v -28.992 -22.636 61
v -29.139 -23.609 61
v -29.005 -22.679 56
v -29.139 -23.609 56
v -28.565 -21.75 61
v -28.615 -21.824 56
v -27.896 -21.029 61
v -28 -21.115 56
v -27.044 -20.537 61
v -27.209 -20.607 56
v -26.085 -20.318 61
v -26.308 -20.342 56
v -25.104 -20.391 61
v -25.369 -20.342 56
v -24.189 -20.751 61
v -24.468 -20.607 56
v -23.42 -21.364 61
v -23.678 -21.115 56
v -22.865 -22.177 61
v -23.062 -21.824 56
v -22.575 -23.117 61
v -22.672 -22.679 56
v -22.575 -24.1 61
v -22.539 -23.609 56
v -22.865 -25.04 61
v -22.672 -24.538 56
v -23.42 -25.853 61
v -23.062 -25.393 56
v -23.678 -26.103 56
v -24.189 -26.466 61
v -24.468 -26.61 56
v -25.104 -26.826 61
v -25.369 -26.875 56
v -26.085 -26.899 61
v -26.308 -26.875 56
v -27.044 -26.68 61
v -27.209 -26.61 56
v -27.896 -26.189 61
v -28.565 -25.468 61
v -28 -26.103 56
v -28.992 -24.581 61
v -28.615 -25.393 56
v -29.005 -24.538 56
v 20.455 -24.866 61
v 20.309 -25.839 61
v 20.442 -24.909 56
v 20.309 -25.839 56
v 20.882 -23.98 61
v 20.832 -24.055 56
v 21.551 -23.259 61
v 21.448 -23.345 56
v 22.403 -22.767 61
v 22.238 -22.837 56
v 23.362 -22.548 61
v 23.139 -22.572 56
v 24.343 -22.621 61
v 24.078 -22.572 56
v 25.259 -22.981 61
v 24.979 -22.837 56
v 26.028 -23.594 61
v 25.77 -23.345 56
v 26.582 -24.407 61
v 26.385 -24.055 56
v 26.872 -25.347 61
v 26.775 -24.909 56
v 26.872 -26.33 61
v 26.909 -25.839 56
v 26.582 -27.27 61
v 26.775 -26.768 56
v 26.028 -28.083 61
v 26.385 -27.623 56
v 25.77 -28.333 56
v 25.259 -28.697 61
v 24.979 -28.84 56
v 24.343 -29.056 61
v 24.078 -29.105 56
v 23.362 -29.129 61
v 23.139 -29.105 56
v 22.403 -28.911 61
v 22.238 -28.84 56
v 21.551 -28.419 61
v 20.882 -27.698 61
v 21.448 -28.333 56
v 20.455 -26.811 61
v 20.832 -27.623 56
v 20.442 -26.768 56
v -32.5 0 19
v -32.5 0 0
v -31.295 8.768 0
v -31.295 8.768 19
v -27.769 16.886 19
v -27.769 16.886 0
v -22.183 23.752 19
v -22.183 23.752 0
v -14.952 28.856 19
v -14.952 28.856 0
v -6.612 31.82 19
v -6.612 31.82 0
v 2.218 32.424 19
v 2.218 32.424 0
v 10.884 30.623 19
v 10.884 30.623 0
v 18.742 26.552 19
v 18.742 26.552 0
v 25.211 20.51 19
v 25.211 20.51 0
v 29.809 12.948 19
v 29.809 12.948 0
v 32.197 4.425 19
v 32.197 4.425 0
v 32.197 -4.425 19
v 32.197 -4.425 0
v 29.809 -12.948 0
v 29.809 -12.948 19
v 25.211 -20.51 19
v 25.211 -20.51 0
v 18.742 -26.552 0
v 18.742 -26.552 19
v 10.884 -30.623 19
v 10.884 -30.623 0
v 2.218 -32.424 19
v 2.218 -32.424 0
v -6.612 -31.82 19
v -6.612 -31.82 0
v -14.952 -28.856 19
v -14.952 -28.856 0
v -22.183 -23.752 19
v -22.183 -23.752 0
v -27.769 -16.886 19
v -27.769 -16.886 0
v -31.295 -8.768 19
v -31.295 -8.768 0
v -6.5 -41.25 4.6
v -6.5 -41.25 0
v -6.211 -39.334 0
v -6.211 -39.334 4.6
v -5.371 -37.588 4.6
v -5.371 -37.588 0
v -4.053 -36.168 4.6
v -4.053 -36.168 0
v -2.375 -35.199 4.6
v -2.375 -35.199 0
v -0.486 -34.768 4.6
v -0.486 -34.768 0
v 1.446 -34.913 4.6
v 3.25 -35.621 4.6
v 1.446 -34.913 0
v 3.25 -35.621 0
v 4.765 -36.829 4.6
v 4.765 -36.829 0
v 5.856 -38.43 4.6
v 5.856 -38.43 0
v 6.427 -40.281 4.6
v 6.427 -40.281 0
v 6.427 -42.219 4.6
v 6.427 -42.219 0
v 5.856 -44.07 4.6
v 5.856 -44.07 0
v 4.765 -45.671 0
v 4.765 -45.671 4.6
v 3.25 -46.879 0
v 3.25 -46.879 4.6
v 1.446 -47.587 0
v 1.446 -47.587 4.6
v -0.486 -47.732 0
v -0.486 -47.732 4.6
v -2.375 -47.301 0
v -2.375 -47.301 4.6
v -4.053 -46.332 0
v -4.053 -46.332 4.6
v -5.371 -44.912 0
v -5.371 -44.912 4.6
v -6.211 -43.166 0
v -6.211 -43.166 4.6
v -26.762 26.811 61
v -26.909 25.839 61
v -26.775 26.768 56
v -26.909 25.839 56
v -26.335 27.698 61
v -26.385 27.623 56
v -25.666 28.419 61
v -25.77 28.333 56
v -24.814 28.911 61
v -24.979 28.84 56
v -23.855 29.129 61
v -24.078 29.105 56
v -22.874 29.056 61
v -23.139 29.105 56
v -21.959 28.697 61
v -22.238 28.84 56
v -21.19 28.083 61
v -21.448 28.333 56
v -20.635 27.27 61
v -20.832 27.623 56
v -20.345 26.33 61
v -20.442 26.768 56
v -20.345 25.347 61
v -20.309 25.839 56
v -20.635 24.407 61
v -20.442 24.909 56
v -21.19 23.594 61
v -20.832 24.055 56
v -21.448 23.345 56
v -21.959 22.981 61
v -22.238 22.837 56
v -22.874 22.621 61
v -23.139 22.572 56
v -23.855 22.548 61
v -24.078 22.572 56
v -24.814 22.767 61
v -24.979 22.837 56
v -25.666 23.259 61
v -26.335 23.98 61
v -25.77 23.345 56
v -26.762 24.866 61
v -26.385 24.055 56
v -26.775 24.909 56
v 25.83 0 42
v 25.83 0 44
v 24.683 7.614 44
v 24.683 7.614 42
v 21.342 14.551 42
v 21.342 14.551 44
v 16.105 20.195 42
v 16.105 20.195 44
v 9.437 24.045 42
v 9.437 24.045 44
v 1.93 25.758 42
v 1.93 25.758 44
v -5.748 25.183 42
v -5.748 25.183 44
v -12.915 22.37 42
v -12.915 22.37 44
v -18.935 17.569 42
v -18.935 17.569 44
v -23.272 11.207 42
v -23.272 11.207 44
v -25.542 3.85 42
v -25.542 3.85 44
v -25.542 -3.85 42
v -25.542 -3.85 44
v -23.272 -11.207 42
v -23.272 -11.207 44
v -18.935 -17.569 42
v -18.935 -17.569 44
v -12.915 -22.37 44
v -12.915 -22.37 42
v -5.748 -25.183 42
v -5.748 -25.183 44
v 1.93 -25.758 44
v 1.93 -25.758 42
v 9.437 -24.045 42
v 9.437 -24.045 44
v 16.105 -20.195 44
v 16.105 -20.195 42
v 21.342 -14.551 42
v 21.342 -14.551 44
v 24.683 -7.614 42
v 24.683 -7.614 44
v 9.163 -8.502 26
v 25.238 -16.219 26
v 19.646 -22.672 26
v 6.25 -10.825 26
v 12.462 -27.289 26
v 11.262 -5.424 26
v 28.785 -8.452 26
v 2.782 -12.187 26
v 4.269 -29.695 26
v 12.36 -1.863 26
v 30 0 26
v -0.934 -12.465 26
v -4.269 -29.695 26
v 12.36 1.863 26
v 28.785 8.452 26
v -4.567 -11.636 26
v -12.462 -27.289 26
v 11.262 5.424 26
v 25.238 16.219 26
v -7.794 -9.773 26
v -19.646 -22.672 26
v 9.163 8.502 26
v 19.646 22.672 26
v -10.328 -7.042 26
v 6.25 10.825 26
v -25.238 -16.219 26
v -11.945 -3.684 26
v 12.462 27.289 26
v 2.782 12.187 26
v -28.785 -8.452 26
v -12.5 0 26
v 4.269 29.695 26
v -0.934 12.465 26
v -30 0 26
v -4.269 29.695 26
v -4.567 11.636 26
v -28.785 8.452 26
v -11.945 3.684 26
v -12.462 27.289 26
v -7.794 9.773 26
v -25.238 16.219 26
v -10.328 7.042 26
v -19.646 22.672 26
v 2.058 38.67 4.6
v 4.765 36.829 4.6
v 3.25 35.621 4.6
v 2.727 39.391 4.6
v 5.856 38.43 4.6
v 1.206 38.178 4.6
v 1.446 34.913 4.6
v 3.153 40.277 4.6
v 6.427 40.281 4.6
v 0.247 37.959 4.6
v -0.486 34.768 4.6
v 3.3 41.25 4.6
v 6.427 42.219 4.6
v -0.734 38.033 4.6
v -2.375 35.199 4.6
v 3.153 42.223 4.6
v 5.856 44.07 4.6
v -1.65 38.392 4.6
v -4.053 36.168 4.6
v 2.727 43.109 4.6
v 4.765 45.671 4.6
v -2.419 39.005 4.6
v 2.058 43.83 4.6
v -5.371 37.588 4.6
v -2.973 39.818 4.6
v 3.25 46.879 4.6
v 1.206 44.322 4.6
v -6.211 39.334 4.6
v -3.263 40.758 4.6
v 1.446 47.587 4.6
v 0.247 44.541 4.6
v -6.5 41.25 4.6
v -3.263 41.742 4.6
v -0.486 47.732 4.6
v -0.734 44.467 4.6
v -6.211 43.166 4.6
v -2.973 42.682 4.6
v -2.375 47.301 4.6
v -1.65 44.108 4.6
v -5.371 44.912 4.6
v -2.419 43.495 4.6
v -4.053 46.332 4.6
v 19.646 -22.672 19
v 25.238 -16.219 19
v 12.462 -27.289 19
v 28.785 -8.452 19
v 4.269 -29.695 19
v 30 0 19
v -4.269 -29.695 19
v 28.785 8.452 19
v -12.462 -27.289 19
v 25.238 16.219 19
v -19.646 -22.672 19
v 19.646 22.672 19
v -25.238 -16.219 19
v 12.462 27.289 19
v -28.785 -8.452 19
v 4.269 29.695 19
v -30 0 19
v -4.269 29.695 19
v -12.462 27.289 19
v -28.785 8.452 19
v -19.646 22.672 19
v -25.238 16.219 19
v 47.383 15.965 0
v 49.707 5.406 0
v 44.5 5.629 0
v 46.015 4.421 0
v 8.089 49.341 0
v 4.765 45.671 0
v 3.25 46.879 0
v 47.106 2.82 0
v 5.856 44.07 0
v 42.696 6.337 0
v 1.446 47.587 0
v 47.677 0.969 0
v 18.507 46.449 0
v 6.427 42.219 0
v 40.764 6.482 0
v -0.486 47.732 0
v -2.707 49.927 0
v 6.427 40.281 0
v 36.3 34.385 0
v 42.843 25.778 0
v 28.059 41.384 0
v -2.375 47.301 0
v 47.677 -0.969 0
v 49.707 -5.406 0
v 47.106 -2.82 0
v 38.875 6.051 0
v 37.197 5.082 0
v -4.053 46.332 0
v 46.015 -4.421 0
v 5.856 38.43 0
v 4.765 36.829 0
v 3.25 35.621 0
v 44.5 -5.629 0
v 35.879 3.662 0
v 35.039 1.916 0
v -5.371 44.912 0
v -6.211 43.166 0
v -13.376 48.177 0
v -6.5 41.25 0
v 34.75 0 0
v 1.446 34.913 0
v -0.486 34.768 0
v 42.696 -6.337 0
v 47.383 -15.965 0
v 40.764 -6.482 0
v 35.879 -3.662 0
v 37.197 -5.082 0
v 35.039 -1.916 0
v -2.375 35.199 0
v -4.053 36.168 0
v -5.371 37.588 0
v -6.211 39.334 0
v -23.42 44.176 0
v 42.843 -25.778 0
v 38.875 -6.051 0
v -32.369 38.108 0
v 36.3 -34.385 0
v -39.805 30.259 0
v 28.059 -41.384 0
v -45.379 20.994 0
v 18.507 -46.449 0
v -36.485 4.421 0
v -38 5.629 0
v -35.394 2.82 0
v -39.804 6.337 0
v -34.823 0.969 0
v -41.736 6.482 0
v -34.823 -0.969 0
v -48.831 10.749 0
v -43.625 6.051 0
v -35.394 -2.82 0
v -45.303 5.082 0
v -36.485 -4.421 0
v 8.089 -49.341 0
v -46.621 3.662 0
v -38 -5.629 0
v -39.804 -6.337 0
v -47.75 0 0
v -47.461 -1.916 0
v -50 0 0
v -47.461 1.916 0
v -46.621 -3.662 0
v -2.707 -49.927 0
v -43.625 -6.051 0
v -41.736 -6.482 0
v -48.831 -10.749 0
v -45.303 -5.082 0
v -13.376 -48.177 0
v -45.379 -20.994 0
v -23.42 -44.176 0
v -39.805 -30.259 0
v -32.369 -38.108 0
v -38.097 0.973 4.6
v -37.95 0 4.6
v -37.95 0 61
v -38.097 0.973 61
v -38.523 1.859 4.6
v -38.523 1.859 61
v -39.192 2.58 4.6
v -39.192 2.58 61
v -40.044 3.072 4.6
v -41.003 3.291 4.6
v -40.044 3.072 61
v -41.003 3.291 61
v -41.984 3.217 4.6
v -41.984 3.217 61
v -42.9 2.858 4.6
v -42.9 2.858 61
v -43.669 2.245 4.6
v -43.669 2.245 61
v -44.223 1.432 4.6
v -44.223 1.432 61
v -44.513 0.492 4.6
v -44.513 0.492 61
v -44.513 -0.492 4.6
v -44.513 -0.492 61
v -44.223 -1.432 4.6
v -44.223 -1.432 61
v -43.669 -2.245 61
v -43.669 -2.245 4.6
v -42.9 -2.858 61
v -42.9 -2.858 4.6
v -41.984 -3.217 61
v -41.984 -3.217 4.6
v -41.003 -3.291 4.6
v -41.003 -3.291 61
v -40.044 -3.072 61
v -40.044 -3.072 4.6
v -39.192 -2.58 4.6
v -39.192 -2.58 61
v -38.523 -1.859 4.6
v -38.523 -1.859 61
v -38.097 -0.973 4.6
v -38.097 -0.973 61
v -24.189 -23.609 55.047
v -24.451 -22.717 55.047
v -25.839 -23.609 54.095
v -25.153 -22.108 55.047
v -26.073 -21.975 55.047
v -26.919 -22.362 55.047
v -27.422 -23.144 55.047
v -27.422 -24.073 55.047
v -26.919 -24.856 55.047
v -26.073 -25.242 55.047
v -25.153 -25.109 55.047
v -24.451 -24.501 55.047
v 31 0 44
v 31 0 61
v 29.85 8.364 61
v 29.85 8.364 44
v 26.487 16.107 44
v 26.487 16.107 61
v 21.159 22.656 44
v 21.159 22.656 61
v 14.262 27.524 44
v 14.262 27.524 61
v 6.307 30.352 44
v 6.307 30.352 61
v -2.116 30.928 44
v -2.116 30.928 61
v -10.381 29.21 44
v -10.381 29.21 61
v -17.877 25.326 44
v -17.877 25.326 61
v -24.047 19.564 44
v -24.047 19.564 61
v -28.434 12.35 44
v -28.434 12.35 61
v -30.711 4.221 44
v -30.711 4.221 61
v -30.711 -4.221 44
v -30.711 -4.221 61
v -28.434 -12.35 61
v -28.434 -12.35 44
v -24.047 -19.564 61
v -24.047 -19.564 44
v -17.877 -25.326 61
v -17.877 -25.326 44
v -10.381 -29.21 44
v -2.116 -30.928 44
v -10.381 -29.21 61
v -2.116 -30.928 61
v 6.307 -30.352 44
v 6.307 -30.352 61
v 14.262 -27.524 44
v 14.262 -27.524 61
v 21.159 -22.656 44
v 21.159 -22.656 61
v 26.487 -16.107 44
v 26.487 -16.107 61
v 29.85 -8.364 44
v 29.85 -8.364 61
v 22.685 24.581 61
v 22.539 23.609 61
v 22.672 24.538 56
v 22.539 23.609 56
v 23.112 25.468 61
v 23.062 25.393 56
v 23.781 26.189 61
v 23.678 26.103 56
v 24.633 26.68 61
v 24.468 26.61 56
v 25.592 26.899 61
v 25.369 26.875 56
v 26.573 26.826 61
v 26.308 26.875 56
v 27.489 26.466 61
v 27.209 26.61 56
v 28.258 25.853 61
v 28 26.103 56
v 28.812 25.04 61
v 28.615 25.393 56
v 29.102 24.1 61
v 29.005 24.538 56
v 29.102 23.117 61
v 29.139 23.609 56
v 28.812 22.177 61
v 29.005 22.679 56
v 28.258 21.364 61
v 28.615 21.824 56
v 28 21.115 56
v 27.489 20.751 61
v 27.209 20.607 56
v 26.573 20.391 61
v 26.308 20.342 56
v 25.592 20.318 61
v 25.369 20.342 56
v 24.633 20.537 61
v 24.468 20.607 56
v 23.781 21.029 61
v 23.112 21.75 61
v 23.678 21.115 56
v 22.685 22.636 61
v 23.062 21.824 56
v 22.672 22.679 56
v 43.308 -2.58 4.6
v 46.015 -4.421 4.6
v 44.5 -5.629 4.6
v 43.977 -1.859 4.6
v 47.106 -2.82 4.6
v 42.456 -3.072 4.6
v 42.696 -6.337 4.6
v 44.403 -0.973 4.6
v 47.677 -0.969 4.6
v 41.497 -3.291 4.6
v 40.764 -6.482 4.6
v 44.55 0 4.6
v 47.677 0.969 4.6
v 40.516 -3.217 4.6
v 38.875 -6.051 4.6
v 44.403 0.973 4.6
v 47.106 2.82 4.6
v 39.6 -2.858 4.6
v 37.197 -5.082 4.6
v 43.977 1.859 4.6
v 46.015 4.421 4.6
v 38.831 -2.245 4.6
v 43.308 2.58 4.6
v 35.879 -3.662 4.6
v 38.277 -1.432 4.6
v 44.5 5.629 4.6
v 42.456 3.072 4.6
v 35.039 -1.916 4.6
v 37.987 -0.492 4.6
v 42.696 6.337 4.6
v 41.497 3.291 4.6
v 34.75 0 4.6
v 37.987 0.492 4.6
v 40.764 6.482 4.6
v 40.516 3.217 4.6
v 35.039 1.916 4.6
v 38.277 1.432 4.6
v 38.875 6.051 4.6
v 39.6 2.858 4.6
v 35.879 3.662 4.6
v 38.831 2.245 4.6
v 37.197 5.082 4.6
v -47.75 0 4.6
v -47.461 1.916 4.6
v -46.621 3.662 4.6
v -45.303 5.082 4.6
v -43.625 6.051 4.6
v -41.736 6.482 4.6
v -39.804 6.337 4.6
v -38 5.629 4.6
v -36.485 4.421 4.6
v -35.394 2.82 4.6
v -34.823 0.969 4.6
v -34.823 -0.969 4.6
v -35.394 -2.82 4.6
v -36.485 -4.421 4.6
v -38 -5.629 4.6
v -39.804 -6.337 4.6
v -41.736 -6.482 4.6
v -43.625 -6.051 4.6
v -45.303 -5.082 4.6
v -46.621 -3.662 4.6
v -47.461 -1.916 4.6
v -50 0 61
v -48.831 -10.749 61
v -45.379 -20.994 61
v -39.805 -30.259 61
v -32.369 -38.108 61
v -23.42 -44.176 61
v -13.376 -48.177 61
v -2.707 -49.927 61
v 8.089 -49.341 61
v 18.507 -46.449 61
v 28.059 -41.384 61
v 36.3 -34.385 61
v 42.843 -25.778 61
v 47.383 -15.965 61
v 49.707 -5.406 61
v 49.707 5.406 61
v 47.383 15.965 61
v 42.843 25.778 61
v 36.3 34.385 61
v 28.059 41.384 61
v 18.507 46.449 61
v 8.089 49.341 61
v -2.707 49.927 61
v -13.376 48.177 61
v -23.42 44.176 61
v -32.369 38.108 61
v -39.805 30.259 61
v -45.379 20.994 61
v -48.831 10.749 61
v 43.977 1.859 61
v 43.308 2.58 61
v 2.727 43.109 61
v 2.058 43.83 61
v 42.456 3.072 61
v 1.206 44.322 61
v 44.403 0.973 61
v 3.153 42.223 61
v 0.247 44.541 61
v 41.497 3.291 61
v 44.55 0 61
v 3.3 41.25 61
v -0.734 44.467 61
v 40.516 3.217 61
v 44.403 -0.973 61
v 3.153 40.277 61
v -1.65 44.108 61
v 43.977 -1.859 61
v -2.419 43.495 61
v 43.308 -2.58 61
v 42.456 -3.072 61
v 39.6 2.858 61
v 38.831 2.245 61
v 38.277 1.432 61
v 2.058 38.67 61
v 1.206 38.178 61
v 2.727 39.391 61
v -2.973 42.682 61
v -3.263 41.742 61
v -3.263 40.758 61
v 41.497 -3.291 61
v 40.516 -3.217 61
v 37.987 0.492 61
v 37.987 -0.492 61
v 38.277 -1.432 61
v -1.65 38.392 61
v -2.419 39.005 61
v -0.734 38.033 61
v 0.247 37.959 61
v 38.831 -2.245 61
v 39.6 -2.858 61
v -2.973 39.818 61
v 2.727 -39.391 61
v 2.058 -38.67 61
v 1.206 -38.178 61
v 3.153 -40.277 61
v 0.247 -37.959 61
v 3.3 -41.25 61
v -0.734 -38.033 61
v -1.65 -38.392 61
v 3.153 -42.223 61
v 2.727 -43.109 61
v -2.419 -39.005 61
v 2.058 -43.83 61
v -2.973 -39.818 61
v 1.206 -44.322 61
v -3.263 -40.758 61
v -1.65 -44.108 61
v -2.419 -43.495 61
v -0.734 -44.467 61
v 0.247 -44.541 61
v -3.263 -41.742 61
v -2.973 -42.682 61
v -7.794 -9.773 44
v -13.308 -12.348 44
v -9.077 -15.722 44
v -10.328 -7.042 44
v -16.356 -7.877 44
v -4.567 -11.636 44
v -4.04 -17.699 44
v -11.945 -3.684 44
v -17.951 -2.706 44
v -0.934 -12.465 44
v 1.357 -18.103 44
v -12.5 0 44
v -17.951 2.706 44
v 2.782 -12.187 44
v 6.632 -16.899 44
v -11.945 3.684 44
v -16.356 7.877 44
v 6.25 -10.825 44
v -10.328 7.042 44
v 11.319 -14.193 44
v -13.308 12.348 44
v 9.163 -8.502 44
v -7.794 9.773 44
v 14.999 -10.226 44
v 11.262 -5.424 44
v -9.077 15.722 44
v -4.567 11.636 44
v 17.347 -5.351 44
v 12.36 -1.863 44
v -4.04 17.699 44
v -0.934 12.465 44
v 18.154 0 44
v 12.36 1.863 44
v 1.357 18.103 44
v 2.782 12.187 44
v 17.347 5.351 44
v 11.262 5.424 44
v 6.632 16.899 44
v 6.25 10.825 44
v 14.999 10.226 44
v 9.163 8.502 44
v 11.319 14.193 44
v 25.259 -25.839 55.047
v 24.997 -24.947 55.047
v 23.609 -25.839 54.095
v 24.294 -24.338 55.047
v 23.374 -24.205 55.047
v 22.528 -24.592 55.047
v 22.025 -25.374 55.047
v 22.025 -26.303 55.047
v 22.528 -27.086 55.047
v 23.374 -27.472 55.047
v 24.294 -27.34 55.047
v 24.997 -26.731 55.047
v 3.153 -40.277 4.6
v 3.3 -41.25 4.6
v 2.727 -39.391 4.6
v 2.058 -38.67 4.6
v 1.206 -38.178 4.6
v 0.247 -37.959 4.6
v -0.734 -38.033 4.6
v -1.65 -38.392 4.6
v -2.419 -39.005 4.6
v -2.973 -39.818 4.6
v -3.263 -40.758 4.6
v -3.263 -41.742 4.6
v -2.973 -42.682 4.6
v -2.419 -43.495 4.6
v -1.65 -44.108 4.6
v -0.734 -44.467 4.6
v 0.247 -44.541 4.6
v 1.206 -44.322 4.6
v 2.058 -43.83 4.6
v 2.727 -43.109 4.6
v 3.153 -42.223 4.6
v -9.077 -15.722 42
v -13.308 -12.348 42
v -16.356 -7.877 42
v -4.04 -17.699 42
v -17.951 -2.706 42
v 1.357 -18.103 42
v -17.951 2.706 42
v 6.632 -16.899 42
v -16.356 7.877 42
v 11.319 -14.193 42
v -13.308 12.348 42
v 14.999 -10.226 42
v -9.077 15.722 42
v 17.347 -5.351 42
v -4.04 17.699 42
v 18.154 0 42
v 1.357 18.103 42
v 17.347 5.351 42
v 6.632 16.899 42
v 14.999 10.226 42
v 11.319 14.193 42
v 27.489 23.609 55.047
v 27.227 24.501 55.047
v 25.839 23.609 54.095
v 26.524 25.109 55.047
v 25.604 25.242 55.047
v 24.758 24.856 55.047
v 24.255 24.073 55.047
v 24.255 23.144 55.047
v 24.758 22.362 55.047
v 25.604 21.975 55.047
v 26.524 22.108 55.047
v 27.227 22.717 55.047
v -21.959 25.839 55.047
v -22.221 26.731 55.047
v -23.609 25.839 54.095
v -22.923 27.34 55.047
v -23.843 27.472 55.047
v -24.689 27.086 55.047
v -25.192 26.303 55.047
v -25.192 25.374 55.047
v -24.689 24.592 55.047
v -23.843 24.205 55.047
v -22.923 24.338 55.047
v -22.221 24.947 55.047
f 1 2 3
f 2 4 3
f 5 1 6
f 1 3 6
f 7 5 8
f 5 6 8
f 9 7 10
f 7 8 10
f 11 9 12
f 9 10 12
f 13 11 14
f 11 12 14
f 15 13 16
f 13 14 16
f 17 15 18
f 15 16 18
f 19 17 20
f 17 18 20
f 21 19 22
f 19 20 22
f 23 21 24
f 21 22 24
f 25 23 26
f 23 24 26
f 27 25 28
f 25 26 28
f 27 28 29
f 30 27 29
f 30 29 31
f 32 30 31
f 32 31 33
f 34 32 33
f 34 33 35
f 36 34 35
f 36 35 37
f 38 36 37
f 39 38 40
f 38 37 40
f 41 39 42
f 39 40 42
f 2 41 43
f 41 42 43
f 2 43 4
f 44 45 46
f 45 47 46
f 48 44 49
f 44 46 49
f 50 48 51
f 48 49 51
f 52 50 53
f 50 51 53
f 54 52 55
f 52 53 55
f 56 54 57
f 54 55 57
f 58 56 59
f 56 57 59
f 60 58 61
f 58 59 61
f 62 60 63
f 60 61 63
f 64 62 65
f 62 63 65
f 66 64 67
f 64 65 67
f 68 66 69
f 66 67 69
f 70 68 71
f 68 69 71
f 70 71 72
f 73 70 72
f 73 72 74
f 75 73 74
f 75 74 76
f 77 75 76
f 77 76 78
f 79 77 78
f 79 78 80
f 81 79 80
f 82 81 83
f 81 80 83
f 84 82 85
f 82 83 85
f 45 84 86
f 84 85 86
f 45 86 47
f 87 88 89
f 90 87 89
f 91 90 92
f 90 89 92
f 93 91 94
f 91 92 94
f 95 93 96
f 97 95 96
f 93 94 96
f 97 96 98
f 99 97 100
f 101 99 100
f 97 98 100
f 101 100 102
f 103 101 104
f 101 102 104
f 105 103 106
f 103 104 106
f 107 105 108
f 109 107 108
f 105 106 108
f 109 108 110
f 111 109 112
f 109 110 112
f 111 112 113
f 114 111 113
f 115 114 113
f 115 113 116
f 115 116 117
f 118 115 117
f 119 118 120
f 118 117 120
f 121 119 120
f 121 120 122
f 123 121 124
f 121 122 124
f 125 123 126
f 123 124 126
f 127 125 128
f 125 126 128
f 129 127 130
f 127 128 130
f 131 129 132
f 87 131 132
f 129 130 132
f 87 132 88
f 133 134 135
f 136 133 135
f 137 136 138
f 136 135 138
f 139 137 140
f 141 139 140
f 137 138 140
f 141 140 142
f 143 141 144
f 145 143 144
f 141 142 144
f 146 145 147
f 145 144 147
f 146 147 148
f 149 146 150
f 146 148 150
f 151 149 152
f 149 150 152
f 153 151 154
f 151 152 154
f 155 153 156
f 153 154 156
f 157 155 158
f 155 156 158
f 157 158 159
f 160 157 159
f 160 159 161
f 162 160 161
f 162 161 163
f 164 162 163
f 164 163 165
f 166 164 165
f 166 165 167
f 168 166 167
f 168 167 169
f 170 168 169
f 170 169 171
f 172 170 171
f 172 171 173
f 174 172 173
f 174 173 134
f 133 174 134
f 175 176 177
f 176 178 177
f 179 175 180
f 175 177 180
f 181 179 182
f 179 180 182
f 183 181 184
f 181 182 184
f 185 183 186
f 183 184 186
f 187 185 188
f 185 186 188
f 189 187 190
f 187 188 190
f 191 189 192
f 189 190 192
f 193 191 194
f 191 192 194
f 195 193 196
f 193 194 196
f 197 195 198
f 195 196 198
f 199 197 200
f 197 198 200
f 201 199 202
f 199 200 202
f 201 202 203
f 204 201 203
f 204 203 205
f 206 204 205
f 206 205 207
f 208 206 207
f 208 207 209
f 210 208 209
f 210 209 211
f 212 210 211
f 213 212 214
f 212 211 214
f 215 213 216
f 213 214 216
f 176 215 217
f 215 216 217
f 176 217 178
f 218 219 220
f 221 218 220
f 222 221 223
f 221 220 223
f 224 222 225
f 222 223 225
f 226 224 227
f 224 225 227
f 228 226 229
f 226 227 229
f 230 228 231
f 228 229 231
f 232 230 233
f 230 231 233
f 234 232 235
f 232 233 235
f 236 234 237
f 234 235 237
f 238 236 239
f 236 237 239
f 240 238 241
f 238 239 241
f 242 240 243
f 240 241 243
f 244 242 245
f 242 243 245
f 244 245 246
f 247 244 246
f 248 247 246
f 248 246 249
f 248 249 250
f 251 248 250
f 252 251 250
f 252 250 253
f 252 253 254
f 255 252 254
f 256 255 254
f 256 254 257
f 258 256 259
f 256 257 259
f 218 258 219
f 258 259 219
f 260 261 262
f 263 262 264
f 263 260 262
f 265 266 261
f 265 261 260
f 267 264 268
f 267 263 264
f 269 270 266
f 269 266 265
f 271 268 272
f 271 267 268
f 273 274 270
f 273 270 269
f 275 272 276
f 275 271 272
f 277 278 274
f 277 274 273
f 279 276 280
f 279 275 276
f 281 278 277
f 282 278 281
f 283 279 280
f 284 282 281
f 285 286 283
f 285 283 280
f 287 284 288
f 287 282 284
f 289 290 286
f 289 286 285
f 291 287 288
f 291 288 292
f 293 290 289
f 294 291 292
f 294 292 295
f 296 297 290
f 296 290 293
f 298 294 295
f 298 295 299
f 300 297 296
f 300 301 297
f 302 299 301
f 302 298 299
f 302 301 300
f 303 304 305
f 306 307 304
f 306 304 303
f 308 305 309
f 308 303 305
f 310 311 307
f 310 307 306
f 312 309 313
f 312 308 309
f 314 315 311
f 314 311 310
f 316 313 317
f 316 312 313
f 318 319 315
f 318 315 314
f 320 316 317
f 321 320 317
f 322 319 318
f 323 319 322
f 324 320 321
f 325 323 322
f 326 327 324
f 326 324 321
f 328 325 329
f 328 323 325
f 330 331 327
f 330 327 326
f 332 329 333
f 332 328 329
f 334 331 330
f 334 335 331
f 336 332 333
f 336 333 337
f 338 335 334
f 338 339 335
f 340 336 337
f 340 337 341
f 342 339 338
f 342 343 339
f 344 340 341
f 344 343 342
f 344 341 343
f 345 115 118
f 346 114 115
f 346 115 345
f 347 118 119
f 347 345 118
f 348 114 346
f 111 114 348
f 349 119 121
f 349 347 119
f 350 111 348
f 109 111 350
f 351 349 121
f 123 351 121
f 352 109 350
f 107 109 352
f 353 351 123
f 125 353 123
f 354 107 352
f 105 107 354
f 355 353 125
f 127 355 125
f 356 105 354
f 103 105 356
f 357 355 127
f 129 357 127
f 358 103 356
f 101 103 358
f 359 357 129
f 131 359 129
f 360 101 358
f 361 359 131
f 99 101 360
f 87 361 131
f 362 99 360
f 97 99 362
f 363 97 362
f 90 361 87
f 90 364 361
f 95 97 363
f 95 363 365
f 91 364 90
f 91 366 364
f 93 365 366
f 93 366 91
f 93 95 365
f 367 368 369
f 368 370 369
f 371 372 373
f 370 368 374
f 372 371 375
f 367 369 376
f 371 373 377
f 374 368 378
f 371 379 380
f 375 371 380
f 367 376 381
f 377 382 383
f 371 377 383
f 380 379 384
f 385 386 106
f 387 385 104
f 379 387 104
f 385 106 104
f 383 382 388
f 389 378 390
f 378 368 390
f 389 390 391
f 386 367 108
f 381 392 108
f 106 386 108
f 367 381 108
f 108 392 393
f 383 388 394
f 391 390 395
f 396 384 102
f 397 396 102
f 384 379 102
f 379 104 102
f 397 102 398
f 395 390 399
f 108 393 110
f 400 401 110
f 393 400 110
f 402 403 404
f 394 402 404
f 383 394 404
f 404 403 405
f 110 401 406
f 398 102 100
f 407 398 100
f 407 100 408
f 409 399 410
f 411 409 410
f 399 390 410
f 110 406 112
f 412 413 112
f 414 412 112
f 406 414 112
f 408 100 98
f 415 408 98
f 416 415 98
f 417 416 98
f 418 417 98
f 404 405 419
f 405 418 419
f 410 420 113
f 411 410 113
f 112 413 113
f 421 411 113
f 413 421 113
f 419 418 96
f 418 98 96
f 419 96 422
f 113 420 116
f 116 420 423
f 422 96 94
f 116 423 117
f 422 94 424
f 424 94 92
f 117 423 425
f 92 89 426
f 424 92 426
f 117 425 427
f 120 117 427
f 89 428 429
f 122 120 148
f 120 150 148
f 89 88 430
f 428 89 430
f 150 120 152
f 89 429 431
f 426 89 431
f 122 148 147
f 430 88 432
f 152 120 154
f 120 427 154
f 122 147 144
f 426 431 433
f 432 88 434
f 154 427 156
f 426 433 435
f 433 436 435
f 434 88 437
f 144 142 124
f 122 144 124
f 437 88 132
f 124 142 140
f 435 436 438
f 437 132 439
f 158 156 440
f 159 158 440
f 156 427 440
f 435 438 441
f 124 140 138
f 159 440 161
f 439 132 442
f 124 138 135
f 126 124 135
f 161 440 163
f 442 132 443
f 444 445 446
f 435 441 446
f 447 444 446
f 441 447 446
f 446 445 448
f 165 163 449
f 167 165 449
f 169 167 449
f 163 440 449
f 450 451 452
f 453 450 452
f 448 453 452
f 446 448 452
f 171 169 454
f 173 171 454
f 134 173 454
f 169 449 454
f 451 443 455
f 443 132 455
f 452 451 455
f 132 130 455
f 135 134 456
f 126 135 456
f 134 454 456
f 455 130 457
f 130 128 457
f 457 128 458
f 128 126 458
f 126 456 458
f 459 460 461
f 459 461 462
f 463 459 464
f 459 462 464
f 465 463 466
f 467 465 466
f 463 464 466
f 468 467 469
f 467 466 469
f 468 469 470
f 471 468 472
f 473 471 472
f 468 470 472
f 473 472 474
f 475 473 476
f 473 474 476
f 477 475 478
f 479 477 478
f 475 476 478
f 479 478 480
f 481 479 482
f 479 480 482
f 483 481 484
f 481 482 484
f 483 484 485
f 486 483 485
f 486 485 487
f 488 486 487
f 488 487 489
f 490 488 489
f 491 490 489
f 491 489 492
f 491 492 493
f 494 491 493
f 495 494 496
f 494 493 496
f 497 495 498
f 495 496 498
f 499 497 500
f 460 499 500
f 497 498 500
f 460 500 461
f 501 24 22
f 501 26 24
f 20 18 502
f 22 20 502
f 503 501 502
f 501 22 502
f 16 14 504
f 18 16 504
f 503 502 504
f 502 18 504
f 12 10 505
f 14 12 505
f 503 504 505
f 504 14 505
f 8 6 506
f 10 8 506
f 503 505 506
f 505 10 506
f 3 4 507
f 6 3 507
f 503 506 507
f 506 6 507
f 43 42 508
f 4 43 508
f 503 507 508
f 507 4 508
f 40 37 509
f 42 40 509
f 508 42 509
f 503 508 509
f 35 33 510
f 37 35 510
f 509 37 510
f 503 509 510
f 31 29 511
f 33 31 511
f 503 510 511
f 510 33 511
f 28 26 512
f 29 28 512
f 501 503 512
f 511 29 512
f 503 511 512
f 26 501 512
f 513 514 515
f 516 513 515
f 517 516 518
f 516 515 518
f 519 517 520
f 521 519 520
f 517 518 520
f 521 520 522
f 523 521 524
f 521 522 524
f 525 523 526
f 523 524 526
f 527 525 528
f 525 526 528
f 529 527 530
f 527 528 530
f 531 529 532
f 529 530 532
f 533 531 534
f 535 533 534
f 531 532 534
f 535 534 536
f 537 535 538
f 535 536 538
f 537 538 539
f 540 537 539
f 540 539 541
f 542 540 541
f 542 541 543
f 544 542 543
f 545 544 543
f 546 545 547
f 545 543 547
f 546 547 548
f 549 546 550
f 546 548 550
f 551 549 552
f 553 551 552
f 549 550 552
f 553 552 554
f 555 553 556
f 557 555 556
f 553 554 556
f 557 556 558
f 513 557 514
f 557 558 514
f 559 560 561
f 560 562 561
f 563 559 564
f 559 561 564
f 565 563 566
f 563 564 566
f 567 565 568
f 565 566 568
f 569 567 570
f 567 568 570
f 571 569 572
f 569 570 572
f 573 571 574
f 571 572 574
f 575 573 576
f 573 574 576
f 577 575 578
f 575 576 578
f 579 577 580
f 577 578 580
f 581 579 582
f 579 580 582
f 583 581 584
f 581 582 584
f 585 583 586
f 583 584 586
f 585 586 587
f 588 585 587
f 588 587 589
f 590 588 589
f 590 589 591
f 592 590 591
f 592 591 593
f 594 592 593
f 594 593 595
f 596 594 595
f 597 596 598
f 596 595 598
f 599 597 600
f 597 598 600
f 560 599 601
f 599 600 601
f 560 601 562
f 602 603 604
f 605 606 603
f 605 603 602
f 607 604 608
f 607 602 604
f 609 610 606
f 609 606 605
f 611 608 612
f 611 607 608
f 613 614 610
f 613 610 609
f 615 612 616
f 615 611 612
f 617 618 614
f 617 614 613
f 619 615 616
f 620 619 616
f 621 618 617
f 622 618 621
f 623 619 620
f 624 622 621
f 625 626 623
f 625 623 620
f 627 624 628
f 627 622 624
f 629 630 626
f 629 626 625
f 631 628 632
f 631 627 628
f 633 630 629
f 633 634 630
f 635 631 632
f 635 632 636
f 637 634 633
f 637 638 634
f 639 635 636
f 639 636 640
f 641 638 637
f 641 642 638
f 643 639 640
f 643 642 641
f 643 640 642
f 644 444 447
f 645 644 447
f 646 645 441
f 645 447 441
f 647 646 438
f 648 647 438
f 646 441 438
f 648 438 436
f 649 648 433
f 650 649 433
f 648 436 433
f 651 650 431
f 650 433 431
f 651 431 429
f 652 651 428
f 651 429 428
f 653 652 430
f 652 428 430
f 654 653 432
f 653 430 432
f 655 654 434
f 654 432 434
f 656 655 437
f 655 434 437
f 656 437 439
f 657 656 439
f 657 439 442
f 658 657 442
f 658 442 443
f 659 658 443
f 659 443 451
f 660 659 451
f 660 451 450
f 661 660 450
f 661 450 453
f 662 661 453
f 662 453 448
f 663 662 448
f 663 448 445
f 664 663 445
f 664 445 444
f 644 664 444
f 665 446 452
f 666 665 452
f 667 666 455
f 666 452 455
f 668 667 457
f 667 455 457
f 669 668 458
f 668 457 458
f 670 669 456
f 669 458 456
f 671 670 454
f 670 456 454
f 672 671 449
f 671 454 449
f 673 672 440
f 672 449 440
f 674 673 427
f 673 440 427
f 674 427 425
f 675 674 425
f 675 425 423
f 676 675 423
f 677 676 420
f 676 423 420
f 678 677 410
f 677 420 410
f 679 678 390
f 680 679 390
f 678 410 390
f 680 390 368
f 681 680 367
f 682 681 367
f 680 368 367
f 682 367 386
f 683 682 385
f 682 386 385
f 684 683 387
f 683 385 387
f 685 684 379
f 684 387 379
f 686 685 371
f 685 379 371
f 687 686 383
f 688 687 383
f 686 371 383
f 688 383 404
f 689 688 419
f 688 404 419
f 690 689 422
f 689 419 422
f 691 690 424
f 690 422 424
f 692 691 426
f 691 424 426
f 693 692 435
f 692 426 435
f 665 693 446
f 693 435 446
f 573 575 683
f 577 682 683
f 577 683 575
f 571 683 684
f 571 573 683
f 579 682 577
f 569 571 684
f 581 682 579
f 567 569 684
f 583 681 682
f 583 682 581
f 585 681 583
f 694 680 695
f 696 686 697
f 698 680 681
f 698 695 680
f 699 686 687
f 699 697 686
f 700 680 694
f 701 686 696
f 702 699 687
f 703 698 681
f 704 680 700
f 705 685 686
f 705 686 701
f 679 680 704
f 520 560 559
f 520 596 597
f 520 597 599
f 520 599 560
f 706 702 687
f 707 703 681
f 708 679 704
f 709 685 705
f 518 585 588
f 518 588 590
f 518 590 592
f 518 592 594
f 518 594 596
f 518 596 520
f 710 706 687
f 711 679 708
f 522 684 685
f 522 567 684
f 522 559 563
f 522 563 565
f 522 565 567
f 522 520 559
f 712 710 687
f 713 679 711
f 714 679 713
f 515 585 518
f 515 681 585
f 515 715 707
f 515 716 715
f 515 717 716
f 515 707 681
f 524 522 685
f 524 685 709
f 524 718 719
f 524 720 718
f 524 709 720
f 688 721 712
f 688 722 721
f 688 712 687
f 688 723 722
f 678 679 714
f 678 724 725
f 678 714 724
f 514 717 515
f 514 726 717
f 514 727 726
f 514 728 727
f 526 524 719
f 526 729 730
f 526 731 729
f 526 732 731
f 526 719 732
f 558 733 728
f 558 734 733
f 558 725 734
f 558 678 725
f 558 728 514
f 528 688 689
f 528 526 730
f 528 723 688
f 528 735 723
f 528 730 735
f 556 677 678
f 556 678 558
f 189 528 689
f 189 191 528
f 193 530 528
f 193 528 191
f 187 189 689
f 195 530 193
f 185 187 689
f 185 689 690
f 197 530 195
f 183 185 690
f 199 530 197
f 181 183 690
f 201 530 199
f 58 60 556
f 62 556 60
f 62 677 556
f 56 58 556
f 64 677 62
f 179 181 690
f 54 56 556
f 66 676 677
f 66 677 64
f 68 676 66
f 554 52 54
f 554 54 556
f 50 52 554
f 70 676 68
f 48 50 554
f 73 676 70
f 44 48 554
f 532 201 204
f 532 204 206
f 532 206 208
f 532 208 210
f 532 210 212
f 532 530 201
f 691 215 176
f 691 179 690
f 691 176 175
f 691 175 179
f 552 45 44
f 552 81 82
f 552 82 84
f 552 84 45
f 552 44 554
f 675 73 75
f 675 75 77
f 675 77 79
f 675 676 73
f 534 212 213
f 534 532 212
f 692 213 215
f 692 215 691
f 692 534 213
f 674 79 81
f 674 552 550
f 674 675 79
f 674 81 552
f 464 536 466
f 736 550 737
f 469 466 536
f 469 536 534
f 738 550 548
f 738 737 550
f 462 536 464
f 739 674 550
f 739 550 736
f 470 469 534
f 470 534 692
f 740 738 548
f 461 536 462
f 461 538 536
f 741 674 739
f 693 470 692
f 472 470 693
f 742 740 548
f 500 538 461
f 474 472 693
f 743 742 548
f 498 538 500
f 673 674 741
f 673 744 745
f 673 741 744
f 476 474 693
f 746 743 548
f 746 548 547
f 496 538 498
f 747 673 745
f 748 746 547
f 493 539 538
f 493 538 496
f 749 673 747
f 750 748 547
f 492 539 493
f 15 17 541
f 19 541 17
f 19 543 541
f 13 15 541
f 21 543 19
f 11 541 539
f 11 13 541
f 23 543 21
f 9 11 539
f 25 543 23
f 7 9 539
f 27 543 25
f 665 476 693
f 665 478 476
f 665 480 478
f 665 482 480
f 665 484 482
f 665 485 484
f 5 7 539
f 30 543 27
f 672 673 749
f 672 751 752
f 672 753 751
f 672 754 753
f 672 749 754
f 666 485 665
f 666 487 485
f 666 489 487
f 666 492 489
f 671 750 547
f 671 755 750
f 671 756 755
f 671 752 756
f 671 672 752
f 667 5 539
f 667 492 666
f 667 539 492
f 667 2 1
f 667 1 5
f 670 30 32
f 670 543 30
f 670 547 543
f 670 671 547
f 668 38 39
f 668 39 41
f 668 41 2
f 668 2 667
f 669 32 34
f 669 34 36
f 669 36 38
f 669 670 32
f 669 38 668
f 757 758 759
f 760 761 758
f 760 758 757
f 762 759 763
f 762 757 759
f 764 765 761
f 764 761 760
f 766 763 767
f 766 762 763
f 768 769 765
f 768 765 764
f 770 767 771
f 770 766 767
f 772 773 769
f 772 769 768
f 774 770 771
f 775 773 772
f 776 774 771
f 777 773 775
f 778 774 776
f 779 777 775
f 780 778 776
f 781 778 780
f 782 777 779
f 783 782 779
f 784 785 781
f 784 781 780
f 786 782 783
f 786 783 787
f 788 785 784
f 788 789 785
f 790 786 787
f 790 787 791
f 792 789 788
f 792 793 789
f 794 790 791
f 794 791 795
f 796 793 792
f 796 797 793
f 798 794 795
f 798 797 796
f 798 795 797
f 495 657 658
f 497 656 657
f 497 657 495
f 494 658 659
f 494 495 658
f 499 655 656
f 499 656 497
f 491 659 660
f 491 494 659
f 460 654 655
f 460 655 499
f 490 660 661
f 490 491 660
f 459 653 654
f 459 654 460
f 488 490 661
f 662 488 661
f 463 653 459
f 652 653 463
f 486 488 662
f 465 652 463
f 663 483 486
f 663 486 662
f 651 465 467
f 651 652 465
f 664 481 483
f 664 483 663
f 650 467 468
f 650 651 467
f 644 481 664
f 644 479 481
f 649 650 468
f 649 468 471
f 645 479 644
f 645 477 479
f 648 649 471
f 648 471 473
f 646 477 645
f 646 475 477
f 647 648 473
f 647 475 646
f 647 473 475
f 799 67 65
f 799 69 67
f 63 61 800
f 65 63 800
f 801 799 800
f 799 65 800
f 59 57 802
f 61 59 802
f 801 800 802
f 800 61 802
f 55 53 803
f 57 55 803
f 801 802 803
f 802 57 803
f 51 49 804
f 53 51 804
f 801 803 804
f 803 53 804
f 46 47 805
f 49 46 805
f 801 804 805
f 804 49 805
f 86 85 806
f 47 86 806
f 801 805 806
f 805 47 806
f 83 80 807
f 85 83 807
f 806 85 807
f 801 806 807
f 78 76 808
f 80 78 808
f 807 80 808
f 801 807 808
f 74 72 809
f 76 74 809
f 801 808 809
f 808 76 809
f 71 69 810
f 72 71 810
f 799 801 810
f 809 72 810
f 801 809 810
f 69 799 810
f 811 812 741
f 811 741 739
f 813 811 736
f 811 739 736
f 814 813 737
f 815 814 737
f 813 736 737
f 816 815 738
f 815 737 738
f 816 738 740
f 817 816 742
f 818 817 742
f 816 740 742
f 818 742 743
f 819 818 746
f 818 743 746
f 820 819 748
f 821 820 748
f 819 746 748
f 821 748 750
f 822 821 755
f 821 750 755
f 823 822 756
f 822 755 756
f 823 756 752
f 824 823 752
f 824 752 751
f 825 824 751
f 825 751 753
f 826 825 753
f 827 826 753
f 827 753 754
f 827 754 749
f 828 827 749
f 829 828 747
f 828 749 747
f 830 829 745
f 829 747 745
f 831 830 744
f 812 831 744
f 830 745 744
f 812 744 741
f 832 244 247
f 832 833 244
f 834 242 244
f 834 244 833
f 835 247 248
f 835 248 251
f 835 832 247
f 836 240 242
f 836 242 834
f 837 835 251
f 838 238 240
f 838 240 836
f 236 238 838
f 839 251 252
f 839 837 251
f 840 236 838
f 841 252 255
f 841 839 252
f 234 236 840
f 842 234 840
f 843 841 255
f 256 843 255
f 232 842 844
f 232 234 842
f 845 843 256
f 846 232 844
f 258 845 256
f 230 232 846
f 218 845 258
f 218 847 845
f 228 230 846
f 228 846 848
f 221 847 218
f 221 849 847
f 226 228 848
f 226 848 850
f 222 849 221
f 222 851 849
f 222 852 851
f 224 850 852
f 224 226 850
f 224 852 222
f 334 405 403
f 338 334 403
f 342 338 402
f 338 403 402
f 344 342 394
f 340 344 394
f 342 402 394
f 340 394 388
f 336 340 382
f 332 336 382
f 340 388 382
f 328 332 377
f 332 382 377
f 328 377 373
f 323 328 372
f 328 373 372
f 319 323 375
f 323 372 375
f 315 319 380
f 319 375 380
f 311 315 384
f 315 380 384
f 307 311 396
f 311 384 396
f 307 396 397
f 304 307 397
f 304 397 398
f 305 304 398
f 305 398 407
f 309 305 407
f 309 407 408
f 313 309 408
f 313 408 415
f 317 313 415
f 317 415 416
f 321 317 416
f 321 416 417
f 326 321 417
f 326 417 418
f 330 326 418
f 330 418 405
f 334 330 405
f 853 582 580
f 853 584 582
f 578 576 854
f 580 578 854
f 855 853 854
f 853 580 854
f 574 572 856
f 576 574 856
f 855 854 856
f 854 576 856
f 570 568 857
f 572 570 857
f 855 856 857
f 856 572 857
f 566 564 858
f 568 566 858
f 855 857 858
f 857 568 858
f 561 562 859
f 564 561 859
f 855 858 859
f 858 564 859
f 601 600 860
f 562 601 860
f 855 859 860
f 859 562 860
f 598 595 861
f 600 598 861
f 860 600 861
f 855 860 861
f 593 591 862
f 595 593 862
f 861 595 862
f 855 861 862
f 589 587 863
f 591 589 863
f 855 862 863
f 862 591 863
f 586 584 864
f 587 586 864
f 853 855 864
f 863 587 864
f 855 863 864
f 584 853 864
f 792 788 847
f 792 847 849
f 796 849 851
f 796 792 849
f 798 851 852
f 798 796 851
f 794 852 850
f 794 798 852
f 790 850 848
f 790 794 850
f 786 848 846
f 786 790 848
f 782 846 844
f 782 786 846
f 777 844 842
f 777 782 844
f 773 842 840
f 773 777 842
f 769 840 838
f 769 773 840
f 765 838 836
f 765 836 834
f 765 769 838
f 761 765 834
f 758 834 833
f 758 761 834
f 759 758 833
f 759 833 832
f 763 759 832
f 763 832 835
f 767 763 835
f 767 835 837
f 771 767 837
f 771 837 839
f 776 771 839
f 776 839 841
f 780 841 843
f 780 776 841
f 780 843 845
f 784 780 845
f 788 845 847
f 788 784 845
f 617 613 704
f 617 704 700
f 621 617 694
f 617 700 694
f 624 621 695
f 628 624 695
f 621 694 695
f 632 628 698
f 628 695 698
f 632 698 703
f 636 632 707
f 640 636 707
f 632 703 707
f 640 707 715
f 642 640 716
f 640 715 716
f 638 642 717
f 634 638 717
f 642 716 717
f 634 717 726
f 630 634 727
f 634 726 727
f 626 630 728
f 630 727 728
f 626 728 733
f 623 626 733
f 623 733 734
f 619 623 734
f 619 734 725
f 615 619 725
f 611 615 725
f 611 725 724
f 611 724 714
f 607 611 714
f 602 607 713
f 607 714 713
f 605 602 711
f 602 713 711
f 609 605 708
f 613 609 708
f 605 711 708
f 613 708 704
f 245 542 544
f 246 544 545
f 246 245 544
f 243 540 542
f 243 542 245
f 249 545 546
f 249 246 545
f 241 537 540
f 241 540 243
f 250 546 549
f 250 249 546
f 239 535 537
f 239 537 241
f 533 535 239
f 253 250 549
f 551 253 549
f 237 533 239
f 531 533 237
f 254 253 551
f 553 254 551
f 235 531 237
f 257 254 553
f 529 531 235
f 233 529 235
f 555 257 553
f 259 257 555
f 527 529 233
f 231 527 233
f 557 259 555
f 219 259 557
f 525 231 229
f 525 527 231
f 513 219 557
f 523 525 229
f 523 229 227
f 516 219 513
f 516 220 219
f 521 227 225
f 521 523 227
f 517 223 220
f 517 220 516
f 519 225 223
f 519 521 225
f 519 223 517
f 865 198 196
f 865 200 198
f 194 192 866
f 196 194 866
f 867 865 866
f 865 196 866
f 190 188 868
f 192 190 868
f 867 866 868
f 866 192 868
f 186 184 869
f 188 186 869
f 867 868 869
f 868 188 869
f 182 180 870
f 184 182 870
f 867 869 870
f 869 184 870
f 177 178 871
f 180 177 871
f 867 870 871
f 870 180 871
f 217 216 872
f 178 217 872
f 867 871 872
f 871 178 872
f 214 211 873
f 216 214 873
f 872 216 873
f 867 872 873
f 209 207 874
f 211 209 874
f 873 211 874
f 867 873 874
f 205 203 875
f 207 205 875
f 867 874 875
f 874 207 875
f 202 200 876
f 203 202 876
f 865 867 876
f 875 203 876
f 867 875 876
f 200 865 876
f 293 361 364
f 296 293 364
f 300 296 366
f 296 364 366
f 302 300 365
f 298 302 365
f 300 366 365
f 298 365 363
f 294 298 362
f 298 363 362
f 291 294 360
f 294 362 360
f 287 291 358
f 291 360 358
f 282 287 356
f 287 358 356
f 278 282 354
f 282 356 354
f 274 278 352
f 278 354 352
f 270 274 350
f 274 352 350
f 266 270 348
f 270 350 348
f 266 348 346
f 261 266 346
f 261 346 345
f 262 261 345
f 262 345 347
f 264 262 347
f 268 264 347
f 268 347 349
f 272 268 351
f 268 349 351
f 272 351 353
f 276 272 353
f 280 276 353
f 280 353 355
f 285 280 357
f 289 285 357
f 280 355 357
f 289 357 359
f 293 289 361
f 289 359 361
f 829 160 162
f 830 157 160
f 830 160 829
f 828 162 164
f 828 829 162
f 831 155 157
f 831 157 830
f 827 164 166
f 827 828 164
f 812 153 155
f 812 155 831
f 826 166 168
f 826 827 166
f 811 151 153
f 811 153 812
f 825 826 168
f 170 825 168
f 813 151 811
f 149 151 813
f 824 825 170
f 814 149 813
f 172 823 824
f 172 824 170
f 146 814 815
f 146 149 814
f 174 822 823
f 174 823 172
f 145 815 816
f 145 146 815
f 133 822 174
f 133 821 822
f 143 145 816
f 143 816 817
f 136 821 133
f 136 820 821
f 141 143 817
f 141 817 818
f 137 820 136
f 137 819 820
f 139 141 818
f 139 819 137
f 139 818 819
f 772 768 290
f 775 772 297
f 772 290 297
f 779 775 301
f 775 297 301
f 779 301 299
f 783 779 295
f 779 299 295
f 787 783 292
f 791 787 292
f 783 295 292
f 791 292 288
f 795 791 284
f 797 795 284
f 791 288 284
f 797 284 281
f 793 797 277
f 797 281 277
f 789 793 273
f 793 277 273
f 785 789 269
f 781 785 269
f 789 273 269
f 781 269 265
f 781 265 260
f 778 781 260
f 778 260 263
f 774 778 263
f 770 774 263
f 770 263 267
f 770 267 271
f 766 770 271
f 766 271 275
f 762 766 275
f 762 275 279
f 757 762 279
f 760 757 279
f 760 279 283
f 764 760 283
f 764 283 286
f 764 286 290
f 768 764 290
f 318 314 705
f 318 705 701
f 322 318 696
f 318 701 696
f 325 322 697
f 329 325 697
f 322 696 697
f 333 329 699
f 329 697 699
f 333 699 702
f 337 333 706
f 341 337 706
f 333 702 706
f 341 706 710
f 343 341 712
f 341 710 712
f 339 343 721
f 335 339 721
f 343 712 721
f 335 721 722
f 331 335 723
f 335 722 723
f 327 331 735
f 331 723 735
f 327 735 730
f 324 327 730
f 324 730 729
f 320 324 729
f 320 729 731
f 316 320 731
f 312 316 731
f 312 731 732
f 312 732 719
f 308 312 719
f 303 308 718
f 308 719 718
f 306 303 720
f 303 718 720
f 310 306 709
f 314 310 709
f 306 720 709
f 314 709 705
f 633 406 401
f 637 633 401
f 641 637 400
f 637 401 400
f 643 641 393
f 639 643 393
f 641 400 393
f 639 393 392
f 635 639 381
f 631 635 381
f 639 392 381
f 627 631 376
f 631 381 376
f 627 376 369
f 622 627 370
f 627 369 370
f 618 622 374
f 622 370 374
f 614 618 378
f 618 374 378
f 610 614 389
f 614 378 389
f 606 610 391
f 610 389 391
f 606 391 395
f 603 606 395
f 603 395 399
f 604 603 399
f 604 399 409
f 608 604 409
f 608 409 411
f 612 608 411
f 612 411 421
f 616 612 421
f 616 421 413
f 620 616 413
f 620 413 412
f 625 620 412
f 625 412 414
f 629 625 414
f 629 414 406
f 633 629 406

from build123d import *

# Parameters (mm, degrees)
ESQUISSE1_R                                        = 50
BOSS_EXTRU_1_DEPTH                                 = 61
ESQUISSE2_R                                        = 32.5
ENL_V_MAT_EXTRU_1_DEPTH                            = 19
ESQUISSE3_R                                        = 30
ENL_V_MAT_EXTRU_2_DEPTH                            = 7
ESQUISSE5_R                                        = 12.5
ENL_V_MAT_EXTRU_3_DEPTH                            = 79.89866919
CHAMBRAGE_POUR_VIS_T_TE_RONDE_BOMB_E_M_D           = 6.6
CHAMBRAGE_POUR_VIS_T_TE_RONDE_BOMB_E_M_CBORE_D     = 13
CHAMBRAGE_POUR_VIS_T_TE_RONDE_BOMB_E_M_CBORE_DEPTH = 4.6
ESQUISSE13_R                                       = 31
ENL_V_MAT_EXTRU_4_DEPTH                            = 17
ESQUISSE14_R                                       = 25.830239332
ESQUISSE14_R_2                                     = 18.153773443
ENL_V_MAT_EXTRU_5_DEPTH                            = 2
D_GAGEMENT_M61_D                                   = 6.6
D_GAGEMENT_M61_DEPTH                               = 5
D_GAGEMENT_M61_TIP                                 = 1.905255888


with BuildPart() as part:
    # Esquisse1 → Boss.-Extru.1 (new body)
    with BuildSketch(Plane.XY):
        with Locations(Location((0, 0, 0), (0, 0, 180))):
            Circle(ESQUISSE1_R)
    extrude(amount=BOSS_EXTRU_1_DEPTH)

    # Esquisse2 → Enlèv. mat.-Extru.1 (cut)
    with BuildSketch(Plane(origin=(0, 0, 0), x_dir=(-1, 0, 0), z_dir=(0, 0, -1))):
        Circle(ESQUISSE2_R)
    extrude(amount=-ENL_V_MAT_EXTRU_1_DEPTH, mode=Mode.SUBTRACT)

    # Esquisse3 → Enlèv. mat.-Extru.2 (cut)
    with BuildSketch(Plane(origin=(0, 0, 19), x_dir=(-1, 0, 0), z_dir=(0, 0, -1))):
        Circle(ESQUISSE3_R)
    extrude(amount=-ENL_V_MAT_EXTRU_2_DEPTH, mode=Mode.SUBTRACT)

    # Esquisse5 → Enlèv. mat.-Extru.3 (cut, through all)
    with BuildSketch(Plane(origin=(0, 0, 26), x_dir=(-1, 0, 0), z_dir=(0, 0, -1))):
        Circle(ESQUISSE5_R)
    extrude(amount=-ENL_V_MAT_EXTRU_3_DEPTH, mode=Mode.SUBTRACT)

    # Chambrage pour vis à tête ronde bombée M61 (through all)
    with Locations(Plane(origin=(0, 0, 0), x_dir=(-1, 0, 0), z_dir=(0, 0, -1))):
        with Locations((41.25, 0), (0, 41.25), (-41.25, 0), (0, -41.25)):
            CounterBoreHole(CHAMBRAGE_POUR_VIS_T_TE_RONDE_BOMB_E_M_D / 2, CHAMBRAGE_POUR_VIS_T_TE_RONDE_BOMB_E_M_CBORE_D / 2, CHAMBRAGE_POUR_VIS_T_TE_RONDE_BOMB_E_M_CBORE_DEPTH)

    # Esquisse13 → Enlèv. mat.-Extru.4 (cut)
    with BuildSketch(Plane.XY.offset(61)):
        Circle(ESQUISSE13_R)
    extrude(amount=-ENL_V_MAT_EXTRU_4_DEPTH, mode=Mode.SUBTRACT)

    # Esquisse14 → Enlèv. mat.-Extru.5 (cut)
    with BuildSketch(Plane.XY.offset(44)):
        Circle(ESQUISSE14_R)
        Circle(ESQUISSE14_R_2, mode=Mode.SUBTRACT)
    extrude(amount=-ENL_V_MAT_EXTRU_5_DEPTH, mode=Mode.SUBTRACT)

    # Dégagement M61
    with Locations(Plane.XY.offset(61)):
        with Locations((-23.608593004, 25.838621023), (-25.838621023, -23.608593004), (23.608593004, -25.838621023), (25.838621023, 23.608593004)):
            Hole(D_GAGEMENT_M61_D / 2, depth=D_GAGEMENT_M61_DEPTH)
            with Locations((0, 0, -(D_GAGEMENT_M61_DEPTH + D_GAGEMENT_M61_TIP / 2))):  # 120° drill point
                Cone(0, D_GAGEMENT_M61_D / 2, D_GAGEMENT_M61_TIP, mode=Mode.SUBTRACT)


solid = part.part
